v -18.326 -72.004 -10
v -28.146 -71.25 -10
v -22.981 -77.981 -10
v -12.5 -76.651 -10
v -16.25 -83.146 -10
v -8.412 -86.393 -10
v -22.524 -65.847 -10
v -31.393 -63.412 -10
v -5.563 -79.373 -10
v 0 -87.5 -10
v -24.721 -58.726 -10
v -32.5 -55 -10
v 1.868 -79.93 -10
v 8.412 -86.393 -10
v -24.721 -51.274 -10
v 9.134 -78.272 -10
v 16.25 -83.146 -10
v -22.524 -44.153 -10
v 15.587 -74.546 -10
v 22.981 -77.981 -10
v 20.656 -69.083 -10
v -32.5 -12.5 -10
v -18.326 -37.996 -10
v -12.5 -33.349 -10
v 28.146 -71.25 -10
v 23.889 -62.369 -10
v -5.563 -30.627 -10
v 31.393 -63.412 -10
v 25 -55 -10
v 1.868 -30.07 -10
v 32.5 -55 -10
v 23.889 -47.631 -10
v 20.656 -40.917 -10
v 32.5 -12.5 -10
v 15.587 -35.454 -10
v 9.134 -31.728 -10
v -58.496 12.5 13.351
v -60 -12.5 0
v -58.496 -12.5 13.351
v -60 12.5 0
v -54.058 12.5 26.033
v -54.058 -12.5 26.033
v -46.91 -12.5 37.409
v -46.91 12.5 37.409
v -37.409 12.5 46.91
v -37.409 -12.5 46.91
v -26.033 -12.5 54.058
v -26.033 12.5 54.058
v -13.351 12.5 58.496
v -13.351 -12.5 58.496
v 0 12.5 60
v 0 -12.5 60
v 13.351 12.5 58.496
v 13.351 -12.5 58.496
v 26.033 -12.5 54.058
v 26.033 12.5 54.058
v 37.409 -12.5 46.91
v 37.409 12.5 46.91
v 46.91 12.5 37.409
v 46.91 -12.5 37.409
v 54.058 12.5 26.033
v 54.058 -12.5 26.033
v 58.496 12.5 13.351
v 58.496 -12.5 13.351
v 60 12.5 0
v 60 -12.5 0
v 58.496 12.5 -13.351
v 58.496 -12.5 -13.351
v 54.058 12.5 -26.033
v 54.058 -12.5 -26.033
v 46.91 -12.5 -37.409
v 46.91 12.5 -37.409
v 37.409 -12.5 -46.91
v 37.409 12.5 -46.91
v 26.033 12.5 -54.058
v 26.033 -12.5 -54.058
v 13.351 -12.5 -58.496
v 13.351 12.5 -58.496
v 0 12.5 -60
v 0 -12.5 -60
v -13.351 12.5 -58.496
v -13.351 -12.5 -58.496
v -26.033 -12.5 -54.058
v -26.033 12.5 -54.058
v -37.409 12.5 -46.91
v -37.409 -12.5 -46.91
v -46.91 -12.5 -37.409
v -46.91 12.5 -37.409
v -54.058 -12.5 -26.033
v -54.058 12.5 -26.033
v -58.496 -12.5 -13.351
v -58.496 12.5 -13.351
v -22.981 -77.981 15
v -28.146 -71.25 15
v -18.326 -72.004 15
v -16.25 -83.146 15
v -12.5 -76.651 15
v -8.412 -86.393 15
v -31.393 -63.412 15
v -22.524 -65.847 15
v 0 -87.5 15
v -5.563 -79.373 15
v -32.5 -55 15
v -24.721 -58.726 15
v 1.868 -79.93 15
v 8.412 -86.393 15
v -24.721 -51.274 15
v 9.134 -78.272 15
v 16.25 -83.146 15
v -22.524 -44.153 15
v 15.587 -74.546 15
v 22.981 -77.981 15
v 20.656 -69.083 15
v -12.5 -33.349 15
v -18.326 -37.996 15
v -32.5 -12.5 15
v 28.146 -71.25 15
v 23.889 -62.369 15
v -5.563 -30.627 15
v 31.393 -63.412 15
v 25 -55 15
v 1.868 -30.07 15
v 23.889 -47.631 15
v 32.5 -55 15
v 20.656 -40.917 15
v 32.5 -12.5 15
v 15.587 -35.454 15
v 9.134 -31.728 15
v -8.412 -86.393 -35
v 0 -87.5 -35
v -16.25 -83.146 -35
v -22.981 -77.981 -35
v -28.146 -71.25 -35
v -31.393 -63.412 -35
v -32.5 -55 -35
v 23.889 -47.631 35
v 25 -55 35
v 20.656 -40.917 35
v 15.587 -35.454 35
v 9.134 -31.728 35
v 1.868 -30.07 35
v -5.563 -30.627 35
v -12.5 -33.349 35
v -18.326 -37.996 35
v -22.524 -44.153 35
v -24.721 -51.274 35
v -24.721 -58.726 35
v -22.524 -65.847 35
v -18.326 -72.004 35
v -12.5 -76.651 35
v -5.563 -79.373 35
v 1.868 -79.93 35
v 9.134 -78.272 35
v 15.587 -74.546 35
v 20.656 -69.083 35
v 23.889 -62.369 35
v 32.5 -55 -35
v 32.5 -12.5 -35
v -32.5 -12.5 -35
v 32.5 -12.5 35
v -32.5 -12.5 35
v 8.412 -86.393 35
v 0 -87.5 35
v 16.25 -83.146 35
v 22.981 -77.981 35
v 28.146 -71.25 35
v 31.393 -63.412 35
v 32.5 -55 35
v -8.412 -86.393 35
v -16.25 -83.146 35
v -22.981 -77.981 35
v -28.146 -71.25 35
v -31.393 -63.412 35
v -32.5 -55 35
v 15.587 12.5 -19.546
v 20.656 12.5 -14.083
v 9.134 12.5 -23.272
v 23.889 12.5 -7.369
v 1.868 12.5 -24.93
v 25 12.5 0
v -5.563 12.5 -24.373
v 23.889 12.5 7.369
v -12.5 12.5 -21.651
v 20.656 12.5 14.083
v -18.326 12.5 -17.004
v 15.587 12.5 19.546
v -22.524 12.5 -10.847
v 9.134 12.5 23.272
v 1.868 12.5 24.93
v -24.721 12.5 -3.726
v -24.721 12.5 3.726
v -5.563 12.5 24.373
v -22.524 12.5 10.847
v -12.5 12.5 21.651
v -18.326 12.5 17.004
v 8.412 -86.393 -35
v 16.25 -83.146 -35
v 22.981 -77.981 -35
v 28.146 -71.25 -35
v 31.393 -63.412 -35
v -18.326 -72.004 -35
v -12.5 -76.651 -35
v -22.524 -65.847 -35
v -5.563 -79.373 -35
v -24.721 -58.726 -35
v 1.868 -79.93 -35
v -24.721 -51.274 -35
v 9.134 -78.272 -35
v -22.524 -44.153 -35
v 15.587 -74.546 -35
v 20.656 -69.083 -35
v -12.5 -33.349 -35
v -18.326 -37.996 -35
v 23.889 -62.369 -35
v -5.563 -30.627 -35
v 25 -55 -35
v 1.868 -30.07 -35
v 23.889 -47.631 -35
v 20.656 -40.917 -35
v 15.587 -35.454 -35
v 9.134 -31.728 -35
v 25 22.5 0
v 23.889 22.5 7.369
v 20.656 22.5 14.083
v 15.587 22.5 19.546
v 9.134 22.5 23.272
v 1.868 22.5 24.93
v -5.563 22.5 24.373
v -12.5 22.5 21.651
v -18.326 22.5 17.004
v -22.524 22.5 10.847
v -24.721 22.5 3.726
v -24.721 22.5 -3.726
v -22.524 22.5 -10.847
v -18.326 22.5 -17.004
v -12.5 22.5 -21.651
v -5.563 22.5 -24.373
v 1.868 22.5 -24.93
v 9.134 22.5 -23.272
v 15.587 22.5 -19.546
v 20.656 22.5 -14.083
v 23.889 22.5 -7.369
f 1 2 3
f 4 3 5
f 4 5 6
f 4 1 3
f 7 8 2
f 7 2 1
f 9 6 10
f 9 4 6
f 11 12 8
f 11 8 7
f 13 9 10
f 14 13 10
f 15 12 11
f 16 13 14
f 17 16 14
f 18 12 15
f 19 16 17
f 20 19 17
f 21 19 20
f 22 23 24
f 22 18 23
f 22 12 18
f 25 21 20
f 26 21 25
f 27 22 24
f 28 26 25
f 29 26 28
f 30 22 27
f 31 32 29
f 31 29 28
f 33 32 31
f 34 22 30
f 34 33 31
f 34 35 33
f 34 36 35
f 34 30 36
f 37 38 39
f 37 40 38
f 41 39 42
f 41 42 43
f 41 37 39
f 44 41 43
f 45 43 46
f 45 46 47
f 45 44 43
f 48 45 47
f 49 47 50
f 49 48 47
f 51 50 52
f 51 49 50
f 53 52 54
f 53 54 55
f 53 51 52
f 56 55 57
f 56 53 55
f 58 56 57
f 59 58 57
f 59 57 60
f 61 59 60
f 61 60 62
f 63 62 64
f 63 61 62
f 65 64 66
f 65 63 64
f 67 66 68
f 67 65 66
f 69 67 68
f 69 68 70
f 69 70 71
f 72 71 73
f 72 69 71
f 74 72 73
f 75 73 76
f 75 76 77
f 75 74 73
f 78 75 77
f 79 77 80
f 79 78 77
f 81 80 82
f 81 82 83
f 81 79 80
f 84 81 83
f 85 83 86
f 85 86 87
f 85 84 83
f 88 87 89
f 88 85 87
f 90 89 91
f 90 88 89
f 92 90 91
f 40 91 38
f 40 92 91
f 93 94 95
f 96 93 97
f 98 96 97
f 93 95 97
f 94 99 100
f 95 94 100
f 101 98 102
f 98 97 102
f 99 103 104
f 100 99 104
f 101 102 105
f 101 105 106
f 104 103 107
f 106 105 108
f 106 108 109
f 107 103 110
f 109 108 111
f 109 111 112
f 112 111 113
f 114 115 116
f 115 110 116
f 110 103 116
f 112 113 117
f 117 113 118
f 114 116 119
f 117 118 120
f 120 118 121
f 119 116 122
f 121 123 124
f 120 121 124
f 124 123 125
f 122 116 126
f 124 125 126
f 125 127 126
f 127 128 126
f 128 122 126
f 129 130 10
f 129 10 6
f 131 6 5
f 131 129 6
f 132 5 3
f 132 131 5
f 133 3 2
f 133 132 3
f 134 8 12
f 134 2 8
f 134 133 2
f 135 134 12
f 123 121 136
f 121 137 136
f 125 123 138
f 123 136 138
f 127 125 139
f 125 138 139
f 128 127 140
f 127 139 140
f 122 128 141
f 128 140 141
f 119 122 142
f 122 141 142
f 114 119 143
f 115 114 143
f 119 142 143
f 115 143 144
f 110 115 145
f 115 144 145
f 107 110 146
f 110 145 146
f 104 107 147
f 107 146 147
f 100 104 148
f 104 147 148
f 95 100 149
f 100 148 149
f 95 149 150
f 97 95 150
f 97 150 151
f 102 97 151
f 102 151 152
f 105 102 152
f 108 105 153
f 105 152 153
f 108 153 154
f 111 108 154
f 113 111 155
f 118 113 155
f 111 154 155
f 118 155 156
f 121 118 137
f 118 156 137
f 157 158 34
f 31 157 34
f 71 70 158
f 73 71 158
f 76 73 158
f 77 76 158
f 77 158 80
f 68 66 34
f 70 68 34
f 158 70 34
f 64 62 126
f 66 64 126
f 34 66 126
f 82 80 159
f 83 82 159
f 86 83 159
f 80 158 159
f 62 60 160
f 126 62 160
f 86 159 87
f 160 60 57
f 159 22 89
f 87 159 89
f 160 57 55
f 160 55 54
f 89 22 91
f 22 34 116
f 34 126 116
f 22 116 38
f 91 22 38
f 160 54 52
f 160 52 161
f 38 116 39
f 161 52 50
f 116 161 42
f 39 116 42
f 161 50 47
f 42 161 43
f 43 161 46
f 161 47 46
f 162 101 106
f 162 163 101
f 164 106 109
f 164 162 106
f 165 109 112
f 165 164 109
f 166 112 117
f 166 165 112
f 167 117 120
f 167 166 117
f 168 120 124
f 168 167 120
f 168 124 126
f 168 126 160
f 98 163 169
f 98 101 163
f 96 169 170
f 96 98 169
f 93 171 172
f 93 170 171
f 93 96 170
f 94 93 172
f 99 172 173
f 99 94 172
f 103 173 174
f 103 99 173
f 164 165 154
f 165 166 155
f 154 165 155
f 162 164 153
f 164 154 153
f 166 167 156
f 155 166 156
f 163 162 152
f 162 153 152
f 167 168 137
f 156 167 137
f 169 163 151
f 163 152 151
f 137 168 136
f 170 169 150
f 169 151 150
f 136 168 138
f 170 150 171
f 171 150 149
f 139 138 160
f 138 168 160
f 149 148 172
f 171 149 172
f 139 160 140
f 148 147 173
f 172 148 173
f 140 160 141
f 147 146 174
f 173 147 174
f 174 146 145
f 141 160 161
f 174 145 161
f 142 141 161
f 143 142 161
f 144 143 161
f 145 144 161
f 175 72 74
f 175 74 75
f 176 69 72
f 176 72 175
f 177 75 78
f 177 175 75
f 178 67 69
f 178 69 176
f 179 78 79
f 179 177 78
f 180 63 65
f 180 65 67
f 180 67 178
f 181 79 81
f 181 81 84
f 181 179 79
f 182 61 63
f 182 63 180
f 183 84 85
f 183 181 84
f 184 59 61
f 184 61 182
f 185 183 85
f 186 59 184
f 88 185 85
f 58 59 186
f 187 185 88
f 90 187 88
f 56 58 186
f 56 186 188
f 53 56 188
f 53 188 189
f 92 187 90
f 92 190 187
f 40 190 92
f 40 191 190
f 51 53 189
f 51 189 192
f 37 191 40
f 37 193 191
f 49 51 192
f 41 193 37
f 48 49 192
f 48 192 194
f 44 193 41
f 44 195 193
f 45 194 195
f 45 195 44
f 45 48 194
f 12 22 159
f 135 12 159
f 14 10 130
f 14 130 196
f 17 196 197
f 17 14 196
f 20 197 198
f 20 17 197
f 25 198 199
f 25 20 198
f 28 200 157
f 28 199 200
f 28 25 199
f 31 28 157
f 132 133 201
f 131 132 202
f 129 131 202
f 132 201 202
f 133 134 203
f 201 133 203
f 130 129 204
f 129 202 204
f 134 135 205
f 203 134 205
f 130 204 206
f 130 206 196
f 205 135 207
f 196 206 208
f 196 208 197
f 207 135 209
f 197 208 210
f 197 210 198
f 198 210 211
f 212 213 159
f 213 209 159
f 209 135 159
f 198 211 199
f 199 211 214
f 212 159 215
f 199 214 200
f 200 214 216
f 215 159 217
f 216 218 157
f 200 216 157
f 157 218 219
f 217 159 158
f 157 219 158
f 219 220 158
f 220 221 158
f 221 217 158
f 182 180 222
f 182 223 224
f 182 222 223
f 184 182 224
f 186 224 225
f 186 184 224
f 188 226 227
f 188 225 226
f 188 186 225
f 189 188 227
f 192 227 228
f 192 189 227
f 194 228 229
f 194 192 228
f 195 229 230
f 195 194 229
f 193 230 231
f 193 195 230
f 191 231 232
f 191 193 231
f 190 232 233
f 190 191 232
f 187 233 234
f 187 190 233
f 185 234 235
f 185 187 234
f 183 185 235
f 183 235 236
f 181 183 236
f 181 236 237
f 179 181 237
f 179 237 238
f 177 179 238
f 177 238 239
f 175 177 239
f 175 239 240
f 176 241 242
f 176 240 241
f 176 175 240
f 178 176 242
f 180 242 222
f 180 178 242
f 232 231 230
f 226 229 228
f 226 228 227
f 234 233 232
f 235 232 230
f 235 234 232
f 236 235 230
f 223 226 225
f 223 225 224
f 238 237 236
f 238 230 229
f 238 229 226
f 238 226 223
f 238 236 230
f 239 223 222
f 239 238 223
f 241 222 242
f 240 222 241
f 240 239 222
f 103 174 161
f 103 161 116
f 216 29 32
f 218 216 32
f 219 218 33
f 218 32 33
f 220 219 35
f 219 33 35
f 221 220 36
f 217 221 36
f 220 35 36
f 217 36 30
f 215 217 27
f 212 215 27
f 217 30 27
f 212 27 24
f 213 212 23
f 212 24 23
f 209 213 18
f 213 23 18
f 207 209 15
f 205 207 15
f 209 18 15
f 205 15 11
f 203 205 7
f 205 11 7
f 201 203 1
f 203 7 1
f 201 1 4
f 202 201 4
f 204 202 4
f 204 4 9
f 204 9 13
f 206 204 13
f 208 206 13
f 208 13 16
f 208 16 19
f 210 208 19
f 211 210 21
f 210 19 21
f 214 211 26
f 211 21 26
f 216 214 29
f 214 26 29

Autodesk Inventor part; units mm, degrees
ref_plane "YZ Plane" through (0, 0, 0) normal (1, 0, 0) x (0, 1, 0)
ref_plane "XZ Plane" through (0, 0, 0) normal (0, 1, 0) x (-1, 0, 0)
ref_plane "XY Plane" through (0, 0, 0) normal (0, 0, 1) x (1, 0, 0)
sketch "Sketch1" plane through (0, 0, 0) normal (0, 1, 0) x (-1, 0, 0)
  circle A0 centre (0, 0) radius 60
  dimension "d0" = 120
extrude "Extrusion1" add sketch "Sketch1" along normal mid plane 25
sketch "Sketch2" plane through (0, 12.5, 0) normal (0, 1, 0) x (1, 0, 0)
  circle A0 centre (0, 0) radius 60 projected
  circle A1 centre (0, 0) radius 25
  dimension "d3" = 50
extrude "Extrusion2" add sketch "Sketch2" along normal blind 10 contours A1
sketch "Sketch3" plane through (0, -12.5, 0) normal (0, -1, 0) x (1, 0, 0)
  line L0 (32.5, 35) -> (-32.5, 35)
  line L1 (-32.5, 35) -> (-32.5, -35)
  line L2 (-32.5, -35) -> (32.5, -35)
  line L3 (32.5, -35) -> (32.5, 35)
  line L4 (32.5, 35) -> (-32.5, -35) construction
  line L5 (-32.5, 35) -> (32.5, -35) construction
  line L6 (32.5, 35) -> (-32.5, 35)
  line L7 (-32.5, 35) -> (-32.5, 15)
  line L8 (-32.5, 15) -> (32.5, 15)
  line L9 (32.5, 15) -> (32.5, 35)
  line L10 (32.5, -35) -> (-32.5, -35)
  line L11 (-32.5, -35) -> (-32.5, -10)
  line L12 (-32.5, -10) -> (32.5, -10)
  line L13 (32.5, -10) -> (32.5, -35)
  point P0 (0, 0)
  dimension "d6" = 65
  dimension "d7" = 70
  dimension "d8" = 20
  dimension "d9" = 25
extrude "Extrusion3" add sketch "Sketch3" along normal blind 75 contours L3 L8 L1 L0 | L3 L2 L1 L12
fillet "Fillet1" radius 32.5 4 edges at (32.5, -87.5, 25) (-32.5, -87.5, 25) (-32.5, -87.5, -22.5) (32.5, -87.5, -22.5)
sketch "Sketch4" plane through (-32.5, -12.5, 35) normal (0, 0, 1) x (1, 0, 0)
  circle A0 centre (32.5, -42.5) radius 25
  arc A1 (0, -42.5) -> (65, -42.5) centre (32.5, -42.5) ccw projected
  point P0 (32.5, 12.5)
  dimension "d13" = 50
extrude "Extrusion4" cut sketch "Sketch4" against normal blind 112.75
properties part number "JOINT BASE1"
